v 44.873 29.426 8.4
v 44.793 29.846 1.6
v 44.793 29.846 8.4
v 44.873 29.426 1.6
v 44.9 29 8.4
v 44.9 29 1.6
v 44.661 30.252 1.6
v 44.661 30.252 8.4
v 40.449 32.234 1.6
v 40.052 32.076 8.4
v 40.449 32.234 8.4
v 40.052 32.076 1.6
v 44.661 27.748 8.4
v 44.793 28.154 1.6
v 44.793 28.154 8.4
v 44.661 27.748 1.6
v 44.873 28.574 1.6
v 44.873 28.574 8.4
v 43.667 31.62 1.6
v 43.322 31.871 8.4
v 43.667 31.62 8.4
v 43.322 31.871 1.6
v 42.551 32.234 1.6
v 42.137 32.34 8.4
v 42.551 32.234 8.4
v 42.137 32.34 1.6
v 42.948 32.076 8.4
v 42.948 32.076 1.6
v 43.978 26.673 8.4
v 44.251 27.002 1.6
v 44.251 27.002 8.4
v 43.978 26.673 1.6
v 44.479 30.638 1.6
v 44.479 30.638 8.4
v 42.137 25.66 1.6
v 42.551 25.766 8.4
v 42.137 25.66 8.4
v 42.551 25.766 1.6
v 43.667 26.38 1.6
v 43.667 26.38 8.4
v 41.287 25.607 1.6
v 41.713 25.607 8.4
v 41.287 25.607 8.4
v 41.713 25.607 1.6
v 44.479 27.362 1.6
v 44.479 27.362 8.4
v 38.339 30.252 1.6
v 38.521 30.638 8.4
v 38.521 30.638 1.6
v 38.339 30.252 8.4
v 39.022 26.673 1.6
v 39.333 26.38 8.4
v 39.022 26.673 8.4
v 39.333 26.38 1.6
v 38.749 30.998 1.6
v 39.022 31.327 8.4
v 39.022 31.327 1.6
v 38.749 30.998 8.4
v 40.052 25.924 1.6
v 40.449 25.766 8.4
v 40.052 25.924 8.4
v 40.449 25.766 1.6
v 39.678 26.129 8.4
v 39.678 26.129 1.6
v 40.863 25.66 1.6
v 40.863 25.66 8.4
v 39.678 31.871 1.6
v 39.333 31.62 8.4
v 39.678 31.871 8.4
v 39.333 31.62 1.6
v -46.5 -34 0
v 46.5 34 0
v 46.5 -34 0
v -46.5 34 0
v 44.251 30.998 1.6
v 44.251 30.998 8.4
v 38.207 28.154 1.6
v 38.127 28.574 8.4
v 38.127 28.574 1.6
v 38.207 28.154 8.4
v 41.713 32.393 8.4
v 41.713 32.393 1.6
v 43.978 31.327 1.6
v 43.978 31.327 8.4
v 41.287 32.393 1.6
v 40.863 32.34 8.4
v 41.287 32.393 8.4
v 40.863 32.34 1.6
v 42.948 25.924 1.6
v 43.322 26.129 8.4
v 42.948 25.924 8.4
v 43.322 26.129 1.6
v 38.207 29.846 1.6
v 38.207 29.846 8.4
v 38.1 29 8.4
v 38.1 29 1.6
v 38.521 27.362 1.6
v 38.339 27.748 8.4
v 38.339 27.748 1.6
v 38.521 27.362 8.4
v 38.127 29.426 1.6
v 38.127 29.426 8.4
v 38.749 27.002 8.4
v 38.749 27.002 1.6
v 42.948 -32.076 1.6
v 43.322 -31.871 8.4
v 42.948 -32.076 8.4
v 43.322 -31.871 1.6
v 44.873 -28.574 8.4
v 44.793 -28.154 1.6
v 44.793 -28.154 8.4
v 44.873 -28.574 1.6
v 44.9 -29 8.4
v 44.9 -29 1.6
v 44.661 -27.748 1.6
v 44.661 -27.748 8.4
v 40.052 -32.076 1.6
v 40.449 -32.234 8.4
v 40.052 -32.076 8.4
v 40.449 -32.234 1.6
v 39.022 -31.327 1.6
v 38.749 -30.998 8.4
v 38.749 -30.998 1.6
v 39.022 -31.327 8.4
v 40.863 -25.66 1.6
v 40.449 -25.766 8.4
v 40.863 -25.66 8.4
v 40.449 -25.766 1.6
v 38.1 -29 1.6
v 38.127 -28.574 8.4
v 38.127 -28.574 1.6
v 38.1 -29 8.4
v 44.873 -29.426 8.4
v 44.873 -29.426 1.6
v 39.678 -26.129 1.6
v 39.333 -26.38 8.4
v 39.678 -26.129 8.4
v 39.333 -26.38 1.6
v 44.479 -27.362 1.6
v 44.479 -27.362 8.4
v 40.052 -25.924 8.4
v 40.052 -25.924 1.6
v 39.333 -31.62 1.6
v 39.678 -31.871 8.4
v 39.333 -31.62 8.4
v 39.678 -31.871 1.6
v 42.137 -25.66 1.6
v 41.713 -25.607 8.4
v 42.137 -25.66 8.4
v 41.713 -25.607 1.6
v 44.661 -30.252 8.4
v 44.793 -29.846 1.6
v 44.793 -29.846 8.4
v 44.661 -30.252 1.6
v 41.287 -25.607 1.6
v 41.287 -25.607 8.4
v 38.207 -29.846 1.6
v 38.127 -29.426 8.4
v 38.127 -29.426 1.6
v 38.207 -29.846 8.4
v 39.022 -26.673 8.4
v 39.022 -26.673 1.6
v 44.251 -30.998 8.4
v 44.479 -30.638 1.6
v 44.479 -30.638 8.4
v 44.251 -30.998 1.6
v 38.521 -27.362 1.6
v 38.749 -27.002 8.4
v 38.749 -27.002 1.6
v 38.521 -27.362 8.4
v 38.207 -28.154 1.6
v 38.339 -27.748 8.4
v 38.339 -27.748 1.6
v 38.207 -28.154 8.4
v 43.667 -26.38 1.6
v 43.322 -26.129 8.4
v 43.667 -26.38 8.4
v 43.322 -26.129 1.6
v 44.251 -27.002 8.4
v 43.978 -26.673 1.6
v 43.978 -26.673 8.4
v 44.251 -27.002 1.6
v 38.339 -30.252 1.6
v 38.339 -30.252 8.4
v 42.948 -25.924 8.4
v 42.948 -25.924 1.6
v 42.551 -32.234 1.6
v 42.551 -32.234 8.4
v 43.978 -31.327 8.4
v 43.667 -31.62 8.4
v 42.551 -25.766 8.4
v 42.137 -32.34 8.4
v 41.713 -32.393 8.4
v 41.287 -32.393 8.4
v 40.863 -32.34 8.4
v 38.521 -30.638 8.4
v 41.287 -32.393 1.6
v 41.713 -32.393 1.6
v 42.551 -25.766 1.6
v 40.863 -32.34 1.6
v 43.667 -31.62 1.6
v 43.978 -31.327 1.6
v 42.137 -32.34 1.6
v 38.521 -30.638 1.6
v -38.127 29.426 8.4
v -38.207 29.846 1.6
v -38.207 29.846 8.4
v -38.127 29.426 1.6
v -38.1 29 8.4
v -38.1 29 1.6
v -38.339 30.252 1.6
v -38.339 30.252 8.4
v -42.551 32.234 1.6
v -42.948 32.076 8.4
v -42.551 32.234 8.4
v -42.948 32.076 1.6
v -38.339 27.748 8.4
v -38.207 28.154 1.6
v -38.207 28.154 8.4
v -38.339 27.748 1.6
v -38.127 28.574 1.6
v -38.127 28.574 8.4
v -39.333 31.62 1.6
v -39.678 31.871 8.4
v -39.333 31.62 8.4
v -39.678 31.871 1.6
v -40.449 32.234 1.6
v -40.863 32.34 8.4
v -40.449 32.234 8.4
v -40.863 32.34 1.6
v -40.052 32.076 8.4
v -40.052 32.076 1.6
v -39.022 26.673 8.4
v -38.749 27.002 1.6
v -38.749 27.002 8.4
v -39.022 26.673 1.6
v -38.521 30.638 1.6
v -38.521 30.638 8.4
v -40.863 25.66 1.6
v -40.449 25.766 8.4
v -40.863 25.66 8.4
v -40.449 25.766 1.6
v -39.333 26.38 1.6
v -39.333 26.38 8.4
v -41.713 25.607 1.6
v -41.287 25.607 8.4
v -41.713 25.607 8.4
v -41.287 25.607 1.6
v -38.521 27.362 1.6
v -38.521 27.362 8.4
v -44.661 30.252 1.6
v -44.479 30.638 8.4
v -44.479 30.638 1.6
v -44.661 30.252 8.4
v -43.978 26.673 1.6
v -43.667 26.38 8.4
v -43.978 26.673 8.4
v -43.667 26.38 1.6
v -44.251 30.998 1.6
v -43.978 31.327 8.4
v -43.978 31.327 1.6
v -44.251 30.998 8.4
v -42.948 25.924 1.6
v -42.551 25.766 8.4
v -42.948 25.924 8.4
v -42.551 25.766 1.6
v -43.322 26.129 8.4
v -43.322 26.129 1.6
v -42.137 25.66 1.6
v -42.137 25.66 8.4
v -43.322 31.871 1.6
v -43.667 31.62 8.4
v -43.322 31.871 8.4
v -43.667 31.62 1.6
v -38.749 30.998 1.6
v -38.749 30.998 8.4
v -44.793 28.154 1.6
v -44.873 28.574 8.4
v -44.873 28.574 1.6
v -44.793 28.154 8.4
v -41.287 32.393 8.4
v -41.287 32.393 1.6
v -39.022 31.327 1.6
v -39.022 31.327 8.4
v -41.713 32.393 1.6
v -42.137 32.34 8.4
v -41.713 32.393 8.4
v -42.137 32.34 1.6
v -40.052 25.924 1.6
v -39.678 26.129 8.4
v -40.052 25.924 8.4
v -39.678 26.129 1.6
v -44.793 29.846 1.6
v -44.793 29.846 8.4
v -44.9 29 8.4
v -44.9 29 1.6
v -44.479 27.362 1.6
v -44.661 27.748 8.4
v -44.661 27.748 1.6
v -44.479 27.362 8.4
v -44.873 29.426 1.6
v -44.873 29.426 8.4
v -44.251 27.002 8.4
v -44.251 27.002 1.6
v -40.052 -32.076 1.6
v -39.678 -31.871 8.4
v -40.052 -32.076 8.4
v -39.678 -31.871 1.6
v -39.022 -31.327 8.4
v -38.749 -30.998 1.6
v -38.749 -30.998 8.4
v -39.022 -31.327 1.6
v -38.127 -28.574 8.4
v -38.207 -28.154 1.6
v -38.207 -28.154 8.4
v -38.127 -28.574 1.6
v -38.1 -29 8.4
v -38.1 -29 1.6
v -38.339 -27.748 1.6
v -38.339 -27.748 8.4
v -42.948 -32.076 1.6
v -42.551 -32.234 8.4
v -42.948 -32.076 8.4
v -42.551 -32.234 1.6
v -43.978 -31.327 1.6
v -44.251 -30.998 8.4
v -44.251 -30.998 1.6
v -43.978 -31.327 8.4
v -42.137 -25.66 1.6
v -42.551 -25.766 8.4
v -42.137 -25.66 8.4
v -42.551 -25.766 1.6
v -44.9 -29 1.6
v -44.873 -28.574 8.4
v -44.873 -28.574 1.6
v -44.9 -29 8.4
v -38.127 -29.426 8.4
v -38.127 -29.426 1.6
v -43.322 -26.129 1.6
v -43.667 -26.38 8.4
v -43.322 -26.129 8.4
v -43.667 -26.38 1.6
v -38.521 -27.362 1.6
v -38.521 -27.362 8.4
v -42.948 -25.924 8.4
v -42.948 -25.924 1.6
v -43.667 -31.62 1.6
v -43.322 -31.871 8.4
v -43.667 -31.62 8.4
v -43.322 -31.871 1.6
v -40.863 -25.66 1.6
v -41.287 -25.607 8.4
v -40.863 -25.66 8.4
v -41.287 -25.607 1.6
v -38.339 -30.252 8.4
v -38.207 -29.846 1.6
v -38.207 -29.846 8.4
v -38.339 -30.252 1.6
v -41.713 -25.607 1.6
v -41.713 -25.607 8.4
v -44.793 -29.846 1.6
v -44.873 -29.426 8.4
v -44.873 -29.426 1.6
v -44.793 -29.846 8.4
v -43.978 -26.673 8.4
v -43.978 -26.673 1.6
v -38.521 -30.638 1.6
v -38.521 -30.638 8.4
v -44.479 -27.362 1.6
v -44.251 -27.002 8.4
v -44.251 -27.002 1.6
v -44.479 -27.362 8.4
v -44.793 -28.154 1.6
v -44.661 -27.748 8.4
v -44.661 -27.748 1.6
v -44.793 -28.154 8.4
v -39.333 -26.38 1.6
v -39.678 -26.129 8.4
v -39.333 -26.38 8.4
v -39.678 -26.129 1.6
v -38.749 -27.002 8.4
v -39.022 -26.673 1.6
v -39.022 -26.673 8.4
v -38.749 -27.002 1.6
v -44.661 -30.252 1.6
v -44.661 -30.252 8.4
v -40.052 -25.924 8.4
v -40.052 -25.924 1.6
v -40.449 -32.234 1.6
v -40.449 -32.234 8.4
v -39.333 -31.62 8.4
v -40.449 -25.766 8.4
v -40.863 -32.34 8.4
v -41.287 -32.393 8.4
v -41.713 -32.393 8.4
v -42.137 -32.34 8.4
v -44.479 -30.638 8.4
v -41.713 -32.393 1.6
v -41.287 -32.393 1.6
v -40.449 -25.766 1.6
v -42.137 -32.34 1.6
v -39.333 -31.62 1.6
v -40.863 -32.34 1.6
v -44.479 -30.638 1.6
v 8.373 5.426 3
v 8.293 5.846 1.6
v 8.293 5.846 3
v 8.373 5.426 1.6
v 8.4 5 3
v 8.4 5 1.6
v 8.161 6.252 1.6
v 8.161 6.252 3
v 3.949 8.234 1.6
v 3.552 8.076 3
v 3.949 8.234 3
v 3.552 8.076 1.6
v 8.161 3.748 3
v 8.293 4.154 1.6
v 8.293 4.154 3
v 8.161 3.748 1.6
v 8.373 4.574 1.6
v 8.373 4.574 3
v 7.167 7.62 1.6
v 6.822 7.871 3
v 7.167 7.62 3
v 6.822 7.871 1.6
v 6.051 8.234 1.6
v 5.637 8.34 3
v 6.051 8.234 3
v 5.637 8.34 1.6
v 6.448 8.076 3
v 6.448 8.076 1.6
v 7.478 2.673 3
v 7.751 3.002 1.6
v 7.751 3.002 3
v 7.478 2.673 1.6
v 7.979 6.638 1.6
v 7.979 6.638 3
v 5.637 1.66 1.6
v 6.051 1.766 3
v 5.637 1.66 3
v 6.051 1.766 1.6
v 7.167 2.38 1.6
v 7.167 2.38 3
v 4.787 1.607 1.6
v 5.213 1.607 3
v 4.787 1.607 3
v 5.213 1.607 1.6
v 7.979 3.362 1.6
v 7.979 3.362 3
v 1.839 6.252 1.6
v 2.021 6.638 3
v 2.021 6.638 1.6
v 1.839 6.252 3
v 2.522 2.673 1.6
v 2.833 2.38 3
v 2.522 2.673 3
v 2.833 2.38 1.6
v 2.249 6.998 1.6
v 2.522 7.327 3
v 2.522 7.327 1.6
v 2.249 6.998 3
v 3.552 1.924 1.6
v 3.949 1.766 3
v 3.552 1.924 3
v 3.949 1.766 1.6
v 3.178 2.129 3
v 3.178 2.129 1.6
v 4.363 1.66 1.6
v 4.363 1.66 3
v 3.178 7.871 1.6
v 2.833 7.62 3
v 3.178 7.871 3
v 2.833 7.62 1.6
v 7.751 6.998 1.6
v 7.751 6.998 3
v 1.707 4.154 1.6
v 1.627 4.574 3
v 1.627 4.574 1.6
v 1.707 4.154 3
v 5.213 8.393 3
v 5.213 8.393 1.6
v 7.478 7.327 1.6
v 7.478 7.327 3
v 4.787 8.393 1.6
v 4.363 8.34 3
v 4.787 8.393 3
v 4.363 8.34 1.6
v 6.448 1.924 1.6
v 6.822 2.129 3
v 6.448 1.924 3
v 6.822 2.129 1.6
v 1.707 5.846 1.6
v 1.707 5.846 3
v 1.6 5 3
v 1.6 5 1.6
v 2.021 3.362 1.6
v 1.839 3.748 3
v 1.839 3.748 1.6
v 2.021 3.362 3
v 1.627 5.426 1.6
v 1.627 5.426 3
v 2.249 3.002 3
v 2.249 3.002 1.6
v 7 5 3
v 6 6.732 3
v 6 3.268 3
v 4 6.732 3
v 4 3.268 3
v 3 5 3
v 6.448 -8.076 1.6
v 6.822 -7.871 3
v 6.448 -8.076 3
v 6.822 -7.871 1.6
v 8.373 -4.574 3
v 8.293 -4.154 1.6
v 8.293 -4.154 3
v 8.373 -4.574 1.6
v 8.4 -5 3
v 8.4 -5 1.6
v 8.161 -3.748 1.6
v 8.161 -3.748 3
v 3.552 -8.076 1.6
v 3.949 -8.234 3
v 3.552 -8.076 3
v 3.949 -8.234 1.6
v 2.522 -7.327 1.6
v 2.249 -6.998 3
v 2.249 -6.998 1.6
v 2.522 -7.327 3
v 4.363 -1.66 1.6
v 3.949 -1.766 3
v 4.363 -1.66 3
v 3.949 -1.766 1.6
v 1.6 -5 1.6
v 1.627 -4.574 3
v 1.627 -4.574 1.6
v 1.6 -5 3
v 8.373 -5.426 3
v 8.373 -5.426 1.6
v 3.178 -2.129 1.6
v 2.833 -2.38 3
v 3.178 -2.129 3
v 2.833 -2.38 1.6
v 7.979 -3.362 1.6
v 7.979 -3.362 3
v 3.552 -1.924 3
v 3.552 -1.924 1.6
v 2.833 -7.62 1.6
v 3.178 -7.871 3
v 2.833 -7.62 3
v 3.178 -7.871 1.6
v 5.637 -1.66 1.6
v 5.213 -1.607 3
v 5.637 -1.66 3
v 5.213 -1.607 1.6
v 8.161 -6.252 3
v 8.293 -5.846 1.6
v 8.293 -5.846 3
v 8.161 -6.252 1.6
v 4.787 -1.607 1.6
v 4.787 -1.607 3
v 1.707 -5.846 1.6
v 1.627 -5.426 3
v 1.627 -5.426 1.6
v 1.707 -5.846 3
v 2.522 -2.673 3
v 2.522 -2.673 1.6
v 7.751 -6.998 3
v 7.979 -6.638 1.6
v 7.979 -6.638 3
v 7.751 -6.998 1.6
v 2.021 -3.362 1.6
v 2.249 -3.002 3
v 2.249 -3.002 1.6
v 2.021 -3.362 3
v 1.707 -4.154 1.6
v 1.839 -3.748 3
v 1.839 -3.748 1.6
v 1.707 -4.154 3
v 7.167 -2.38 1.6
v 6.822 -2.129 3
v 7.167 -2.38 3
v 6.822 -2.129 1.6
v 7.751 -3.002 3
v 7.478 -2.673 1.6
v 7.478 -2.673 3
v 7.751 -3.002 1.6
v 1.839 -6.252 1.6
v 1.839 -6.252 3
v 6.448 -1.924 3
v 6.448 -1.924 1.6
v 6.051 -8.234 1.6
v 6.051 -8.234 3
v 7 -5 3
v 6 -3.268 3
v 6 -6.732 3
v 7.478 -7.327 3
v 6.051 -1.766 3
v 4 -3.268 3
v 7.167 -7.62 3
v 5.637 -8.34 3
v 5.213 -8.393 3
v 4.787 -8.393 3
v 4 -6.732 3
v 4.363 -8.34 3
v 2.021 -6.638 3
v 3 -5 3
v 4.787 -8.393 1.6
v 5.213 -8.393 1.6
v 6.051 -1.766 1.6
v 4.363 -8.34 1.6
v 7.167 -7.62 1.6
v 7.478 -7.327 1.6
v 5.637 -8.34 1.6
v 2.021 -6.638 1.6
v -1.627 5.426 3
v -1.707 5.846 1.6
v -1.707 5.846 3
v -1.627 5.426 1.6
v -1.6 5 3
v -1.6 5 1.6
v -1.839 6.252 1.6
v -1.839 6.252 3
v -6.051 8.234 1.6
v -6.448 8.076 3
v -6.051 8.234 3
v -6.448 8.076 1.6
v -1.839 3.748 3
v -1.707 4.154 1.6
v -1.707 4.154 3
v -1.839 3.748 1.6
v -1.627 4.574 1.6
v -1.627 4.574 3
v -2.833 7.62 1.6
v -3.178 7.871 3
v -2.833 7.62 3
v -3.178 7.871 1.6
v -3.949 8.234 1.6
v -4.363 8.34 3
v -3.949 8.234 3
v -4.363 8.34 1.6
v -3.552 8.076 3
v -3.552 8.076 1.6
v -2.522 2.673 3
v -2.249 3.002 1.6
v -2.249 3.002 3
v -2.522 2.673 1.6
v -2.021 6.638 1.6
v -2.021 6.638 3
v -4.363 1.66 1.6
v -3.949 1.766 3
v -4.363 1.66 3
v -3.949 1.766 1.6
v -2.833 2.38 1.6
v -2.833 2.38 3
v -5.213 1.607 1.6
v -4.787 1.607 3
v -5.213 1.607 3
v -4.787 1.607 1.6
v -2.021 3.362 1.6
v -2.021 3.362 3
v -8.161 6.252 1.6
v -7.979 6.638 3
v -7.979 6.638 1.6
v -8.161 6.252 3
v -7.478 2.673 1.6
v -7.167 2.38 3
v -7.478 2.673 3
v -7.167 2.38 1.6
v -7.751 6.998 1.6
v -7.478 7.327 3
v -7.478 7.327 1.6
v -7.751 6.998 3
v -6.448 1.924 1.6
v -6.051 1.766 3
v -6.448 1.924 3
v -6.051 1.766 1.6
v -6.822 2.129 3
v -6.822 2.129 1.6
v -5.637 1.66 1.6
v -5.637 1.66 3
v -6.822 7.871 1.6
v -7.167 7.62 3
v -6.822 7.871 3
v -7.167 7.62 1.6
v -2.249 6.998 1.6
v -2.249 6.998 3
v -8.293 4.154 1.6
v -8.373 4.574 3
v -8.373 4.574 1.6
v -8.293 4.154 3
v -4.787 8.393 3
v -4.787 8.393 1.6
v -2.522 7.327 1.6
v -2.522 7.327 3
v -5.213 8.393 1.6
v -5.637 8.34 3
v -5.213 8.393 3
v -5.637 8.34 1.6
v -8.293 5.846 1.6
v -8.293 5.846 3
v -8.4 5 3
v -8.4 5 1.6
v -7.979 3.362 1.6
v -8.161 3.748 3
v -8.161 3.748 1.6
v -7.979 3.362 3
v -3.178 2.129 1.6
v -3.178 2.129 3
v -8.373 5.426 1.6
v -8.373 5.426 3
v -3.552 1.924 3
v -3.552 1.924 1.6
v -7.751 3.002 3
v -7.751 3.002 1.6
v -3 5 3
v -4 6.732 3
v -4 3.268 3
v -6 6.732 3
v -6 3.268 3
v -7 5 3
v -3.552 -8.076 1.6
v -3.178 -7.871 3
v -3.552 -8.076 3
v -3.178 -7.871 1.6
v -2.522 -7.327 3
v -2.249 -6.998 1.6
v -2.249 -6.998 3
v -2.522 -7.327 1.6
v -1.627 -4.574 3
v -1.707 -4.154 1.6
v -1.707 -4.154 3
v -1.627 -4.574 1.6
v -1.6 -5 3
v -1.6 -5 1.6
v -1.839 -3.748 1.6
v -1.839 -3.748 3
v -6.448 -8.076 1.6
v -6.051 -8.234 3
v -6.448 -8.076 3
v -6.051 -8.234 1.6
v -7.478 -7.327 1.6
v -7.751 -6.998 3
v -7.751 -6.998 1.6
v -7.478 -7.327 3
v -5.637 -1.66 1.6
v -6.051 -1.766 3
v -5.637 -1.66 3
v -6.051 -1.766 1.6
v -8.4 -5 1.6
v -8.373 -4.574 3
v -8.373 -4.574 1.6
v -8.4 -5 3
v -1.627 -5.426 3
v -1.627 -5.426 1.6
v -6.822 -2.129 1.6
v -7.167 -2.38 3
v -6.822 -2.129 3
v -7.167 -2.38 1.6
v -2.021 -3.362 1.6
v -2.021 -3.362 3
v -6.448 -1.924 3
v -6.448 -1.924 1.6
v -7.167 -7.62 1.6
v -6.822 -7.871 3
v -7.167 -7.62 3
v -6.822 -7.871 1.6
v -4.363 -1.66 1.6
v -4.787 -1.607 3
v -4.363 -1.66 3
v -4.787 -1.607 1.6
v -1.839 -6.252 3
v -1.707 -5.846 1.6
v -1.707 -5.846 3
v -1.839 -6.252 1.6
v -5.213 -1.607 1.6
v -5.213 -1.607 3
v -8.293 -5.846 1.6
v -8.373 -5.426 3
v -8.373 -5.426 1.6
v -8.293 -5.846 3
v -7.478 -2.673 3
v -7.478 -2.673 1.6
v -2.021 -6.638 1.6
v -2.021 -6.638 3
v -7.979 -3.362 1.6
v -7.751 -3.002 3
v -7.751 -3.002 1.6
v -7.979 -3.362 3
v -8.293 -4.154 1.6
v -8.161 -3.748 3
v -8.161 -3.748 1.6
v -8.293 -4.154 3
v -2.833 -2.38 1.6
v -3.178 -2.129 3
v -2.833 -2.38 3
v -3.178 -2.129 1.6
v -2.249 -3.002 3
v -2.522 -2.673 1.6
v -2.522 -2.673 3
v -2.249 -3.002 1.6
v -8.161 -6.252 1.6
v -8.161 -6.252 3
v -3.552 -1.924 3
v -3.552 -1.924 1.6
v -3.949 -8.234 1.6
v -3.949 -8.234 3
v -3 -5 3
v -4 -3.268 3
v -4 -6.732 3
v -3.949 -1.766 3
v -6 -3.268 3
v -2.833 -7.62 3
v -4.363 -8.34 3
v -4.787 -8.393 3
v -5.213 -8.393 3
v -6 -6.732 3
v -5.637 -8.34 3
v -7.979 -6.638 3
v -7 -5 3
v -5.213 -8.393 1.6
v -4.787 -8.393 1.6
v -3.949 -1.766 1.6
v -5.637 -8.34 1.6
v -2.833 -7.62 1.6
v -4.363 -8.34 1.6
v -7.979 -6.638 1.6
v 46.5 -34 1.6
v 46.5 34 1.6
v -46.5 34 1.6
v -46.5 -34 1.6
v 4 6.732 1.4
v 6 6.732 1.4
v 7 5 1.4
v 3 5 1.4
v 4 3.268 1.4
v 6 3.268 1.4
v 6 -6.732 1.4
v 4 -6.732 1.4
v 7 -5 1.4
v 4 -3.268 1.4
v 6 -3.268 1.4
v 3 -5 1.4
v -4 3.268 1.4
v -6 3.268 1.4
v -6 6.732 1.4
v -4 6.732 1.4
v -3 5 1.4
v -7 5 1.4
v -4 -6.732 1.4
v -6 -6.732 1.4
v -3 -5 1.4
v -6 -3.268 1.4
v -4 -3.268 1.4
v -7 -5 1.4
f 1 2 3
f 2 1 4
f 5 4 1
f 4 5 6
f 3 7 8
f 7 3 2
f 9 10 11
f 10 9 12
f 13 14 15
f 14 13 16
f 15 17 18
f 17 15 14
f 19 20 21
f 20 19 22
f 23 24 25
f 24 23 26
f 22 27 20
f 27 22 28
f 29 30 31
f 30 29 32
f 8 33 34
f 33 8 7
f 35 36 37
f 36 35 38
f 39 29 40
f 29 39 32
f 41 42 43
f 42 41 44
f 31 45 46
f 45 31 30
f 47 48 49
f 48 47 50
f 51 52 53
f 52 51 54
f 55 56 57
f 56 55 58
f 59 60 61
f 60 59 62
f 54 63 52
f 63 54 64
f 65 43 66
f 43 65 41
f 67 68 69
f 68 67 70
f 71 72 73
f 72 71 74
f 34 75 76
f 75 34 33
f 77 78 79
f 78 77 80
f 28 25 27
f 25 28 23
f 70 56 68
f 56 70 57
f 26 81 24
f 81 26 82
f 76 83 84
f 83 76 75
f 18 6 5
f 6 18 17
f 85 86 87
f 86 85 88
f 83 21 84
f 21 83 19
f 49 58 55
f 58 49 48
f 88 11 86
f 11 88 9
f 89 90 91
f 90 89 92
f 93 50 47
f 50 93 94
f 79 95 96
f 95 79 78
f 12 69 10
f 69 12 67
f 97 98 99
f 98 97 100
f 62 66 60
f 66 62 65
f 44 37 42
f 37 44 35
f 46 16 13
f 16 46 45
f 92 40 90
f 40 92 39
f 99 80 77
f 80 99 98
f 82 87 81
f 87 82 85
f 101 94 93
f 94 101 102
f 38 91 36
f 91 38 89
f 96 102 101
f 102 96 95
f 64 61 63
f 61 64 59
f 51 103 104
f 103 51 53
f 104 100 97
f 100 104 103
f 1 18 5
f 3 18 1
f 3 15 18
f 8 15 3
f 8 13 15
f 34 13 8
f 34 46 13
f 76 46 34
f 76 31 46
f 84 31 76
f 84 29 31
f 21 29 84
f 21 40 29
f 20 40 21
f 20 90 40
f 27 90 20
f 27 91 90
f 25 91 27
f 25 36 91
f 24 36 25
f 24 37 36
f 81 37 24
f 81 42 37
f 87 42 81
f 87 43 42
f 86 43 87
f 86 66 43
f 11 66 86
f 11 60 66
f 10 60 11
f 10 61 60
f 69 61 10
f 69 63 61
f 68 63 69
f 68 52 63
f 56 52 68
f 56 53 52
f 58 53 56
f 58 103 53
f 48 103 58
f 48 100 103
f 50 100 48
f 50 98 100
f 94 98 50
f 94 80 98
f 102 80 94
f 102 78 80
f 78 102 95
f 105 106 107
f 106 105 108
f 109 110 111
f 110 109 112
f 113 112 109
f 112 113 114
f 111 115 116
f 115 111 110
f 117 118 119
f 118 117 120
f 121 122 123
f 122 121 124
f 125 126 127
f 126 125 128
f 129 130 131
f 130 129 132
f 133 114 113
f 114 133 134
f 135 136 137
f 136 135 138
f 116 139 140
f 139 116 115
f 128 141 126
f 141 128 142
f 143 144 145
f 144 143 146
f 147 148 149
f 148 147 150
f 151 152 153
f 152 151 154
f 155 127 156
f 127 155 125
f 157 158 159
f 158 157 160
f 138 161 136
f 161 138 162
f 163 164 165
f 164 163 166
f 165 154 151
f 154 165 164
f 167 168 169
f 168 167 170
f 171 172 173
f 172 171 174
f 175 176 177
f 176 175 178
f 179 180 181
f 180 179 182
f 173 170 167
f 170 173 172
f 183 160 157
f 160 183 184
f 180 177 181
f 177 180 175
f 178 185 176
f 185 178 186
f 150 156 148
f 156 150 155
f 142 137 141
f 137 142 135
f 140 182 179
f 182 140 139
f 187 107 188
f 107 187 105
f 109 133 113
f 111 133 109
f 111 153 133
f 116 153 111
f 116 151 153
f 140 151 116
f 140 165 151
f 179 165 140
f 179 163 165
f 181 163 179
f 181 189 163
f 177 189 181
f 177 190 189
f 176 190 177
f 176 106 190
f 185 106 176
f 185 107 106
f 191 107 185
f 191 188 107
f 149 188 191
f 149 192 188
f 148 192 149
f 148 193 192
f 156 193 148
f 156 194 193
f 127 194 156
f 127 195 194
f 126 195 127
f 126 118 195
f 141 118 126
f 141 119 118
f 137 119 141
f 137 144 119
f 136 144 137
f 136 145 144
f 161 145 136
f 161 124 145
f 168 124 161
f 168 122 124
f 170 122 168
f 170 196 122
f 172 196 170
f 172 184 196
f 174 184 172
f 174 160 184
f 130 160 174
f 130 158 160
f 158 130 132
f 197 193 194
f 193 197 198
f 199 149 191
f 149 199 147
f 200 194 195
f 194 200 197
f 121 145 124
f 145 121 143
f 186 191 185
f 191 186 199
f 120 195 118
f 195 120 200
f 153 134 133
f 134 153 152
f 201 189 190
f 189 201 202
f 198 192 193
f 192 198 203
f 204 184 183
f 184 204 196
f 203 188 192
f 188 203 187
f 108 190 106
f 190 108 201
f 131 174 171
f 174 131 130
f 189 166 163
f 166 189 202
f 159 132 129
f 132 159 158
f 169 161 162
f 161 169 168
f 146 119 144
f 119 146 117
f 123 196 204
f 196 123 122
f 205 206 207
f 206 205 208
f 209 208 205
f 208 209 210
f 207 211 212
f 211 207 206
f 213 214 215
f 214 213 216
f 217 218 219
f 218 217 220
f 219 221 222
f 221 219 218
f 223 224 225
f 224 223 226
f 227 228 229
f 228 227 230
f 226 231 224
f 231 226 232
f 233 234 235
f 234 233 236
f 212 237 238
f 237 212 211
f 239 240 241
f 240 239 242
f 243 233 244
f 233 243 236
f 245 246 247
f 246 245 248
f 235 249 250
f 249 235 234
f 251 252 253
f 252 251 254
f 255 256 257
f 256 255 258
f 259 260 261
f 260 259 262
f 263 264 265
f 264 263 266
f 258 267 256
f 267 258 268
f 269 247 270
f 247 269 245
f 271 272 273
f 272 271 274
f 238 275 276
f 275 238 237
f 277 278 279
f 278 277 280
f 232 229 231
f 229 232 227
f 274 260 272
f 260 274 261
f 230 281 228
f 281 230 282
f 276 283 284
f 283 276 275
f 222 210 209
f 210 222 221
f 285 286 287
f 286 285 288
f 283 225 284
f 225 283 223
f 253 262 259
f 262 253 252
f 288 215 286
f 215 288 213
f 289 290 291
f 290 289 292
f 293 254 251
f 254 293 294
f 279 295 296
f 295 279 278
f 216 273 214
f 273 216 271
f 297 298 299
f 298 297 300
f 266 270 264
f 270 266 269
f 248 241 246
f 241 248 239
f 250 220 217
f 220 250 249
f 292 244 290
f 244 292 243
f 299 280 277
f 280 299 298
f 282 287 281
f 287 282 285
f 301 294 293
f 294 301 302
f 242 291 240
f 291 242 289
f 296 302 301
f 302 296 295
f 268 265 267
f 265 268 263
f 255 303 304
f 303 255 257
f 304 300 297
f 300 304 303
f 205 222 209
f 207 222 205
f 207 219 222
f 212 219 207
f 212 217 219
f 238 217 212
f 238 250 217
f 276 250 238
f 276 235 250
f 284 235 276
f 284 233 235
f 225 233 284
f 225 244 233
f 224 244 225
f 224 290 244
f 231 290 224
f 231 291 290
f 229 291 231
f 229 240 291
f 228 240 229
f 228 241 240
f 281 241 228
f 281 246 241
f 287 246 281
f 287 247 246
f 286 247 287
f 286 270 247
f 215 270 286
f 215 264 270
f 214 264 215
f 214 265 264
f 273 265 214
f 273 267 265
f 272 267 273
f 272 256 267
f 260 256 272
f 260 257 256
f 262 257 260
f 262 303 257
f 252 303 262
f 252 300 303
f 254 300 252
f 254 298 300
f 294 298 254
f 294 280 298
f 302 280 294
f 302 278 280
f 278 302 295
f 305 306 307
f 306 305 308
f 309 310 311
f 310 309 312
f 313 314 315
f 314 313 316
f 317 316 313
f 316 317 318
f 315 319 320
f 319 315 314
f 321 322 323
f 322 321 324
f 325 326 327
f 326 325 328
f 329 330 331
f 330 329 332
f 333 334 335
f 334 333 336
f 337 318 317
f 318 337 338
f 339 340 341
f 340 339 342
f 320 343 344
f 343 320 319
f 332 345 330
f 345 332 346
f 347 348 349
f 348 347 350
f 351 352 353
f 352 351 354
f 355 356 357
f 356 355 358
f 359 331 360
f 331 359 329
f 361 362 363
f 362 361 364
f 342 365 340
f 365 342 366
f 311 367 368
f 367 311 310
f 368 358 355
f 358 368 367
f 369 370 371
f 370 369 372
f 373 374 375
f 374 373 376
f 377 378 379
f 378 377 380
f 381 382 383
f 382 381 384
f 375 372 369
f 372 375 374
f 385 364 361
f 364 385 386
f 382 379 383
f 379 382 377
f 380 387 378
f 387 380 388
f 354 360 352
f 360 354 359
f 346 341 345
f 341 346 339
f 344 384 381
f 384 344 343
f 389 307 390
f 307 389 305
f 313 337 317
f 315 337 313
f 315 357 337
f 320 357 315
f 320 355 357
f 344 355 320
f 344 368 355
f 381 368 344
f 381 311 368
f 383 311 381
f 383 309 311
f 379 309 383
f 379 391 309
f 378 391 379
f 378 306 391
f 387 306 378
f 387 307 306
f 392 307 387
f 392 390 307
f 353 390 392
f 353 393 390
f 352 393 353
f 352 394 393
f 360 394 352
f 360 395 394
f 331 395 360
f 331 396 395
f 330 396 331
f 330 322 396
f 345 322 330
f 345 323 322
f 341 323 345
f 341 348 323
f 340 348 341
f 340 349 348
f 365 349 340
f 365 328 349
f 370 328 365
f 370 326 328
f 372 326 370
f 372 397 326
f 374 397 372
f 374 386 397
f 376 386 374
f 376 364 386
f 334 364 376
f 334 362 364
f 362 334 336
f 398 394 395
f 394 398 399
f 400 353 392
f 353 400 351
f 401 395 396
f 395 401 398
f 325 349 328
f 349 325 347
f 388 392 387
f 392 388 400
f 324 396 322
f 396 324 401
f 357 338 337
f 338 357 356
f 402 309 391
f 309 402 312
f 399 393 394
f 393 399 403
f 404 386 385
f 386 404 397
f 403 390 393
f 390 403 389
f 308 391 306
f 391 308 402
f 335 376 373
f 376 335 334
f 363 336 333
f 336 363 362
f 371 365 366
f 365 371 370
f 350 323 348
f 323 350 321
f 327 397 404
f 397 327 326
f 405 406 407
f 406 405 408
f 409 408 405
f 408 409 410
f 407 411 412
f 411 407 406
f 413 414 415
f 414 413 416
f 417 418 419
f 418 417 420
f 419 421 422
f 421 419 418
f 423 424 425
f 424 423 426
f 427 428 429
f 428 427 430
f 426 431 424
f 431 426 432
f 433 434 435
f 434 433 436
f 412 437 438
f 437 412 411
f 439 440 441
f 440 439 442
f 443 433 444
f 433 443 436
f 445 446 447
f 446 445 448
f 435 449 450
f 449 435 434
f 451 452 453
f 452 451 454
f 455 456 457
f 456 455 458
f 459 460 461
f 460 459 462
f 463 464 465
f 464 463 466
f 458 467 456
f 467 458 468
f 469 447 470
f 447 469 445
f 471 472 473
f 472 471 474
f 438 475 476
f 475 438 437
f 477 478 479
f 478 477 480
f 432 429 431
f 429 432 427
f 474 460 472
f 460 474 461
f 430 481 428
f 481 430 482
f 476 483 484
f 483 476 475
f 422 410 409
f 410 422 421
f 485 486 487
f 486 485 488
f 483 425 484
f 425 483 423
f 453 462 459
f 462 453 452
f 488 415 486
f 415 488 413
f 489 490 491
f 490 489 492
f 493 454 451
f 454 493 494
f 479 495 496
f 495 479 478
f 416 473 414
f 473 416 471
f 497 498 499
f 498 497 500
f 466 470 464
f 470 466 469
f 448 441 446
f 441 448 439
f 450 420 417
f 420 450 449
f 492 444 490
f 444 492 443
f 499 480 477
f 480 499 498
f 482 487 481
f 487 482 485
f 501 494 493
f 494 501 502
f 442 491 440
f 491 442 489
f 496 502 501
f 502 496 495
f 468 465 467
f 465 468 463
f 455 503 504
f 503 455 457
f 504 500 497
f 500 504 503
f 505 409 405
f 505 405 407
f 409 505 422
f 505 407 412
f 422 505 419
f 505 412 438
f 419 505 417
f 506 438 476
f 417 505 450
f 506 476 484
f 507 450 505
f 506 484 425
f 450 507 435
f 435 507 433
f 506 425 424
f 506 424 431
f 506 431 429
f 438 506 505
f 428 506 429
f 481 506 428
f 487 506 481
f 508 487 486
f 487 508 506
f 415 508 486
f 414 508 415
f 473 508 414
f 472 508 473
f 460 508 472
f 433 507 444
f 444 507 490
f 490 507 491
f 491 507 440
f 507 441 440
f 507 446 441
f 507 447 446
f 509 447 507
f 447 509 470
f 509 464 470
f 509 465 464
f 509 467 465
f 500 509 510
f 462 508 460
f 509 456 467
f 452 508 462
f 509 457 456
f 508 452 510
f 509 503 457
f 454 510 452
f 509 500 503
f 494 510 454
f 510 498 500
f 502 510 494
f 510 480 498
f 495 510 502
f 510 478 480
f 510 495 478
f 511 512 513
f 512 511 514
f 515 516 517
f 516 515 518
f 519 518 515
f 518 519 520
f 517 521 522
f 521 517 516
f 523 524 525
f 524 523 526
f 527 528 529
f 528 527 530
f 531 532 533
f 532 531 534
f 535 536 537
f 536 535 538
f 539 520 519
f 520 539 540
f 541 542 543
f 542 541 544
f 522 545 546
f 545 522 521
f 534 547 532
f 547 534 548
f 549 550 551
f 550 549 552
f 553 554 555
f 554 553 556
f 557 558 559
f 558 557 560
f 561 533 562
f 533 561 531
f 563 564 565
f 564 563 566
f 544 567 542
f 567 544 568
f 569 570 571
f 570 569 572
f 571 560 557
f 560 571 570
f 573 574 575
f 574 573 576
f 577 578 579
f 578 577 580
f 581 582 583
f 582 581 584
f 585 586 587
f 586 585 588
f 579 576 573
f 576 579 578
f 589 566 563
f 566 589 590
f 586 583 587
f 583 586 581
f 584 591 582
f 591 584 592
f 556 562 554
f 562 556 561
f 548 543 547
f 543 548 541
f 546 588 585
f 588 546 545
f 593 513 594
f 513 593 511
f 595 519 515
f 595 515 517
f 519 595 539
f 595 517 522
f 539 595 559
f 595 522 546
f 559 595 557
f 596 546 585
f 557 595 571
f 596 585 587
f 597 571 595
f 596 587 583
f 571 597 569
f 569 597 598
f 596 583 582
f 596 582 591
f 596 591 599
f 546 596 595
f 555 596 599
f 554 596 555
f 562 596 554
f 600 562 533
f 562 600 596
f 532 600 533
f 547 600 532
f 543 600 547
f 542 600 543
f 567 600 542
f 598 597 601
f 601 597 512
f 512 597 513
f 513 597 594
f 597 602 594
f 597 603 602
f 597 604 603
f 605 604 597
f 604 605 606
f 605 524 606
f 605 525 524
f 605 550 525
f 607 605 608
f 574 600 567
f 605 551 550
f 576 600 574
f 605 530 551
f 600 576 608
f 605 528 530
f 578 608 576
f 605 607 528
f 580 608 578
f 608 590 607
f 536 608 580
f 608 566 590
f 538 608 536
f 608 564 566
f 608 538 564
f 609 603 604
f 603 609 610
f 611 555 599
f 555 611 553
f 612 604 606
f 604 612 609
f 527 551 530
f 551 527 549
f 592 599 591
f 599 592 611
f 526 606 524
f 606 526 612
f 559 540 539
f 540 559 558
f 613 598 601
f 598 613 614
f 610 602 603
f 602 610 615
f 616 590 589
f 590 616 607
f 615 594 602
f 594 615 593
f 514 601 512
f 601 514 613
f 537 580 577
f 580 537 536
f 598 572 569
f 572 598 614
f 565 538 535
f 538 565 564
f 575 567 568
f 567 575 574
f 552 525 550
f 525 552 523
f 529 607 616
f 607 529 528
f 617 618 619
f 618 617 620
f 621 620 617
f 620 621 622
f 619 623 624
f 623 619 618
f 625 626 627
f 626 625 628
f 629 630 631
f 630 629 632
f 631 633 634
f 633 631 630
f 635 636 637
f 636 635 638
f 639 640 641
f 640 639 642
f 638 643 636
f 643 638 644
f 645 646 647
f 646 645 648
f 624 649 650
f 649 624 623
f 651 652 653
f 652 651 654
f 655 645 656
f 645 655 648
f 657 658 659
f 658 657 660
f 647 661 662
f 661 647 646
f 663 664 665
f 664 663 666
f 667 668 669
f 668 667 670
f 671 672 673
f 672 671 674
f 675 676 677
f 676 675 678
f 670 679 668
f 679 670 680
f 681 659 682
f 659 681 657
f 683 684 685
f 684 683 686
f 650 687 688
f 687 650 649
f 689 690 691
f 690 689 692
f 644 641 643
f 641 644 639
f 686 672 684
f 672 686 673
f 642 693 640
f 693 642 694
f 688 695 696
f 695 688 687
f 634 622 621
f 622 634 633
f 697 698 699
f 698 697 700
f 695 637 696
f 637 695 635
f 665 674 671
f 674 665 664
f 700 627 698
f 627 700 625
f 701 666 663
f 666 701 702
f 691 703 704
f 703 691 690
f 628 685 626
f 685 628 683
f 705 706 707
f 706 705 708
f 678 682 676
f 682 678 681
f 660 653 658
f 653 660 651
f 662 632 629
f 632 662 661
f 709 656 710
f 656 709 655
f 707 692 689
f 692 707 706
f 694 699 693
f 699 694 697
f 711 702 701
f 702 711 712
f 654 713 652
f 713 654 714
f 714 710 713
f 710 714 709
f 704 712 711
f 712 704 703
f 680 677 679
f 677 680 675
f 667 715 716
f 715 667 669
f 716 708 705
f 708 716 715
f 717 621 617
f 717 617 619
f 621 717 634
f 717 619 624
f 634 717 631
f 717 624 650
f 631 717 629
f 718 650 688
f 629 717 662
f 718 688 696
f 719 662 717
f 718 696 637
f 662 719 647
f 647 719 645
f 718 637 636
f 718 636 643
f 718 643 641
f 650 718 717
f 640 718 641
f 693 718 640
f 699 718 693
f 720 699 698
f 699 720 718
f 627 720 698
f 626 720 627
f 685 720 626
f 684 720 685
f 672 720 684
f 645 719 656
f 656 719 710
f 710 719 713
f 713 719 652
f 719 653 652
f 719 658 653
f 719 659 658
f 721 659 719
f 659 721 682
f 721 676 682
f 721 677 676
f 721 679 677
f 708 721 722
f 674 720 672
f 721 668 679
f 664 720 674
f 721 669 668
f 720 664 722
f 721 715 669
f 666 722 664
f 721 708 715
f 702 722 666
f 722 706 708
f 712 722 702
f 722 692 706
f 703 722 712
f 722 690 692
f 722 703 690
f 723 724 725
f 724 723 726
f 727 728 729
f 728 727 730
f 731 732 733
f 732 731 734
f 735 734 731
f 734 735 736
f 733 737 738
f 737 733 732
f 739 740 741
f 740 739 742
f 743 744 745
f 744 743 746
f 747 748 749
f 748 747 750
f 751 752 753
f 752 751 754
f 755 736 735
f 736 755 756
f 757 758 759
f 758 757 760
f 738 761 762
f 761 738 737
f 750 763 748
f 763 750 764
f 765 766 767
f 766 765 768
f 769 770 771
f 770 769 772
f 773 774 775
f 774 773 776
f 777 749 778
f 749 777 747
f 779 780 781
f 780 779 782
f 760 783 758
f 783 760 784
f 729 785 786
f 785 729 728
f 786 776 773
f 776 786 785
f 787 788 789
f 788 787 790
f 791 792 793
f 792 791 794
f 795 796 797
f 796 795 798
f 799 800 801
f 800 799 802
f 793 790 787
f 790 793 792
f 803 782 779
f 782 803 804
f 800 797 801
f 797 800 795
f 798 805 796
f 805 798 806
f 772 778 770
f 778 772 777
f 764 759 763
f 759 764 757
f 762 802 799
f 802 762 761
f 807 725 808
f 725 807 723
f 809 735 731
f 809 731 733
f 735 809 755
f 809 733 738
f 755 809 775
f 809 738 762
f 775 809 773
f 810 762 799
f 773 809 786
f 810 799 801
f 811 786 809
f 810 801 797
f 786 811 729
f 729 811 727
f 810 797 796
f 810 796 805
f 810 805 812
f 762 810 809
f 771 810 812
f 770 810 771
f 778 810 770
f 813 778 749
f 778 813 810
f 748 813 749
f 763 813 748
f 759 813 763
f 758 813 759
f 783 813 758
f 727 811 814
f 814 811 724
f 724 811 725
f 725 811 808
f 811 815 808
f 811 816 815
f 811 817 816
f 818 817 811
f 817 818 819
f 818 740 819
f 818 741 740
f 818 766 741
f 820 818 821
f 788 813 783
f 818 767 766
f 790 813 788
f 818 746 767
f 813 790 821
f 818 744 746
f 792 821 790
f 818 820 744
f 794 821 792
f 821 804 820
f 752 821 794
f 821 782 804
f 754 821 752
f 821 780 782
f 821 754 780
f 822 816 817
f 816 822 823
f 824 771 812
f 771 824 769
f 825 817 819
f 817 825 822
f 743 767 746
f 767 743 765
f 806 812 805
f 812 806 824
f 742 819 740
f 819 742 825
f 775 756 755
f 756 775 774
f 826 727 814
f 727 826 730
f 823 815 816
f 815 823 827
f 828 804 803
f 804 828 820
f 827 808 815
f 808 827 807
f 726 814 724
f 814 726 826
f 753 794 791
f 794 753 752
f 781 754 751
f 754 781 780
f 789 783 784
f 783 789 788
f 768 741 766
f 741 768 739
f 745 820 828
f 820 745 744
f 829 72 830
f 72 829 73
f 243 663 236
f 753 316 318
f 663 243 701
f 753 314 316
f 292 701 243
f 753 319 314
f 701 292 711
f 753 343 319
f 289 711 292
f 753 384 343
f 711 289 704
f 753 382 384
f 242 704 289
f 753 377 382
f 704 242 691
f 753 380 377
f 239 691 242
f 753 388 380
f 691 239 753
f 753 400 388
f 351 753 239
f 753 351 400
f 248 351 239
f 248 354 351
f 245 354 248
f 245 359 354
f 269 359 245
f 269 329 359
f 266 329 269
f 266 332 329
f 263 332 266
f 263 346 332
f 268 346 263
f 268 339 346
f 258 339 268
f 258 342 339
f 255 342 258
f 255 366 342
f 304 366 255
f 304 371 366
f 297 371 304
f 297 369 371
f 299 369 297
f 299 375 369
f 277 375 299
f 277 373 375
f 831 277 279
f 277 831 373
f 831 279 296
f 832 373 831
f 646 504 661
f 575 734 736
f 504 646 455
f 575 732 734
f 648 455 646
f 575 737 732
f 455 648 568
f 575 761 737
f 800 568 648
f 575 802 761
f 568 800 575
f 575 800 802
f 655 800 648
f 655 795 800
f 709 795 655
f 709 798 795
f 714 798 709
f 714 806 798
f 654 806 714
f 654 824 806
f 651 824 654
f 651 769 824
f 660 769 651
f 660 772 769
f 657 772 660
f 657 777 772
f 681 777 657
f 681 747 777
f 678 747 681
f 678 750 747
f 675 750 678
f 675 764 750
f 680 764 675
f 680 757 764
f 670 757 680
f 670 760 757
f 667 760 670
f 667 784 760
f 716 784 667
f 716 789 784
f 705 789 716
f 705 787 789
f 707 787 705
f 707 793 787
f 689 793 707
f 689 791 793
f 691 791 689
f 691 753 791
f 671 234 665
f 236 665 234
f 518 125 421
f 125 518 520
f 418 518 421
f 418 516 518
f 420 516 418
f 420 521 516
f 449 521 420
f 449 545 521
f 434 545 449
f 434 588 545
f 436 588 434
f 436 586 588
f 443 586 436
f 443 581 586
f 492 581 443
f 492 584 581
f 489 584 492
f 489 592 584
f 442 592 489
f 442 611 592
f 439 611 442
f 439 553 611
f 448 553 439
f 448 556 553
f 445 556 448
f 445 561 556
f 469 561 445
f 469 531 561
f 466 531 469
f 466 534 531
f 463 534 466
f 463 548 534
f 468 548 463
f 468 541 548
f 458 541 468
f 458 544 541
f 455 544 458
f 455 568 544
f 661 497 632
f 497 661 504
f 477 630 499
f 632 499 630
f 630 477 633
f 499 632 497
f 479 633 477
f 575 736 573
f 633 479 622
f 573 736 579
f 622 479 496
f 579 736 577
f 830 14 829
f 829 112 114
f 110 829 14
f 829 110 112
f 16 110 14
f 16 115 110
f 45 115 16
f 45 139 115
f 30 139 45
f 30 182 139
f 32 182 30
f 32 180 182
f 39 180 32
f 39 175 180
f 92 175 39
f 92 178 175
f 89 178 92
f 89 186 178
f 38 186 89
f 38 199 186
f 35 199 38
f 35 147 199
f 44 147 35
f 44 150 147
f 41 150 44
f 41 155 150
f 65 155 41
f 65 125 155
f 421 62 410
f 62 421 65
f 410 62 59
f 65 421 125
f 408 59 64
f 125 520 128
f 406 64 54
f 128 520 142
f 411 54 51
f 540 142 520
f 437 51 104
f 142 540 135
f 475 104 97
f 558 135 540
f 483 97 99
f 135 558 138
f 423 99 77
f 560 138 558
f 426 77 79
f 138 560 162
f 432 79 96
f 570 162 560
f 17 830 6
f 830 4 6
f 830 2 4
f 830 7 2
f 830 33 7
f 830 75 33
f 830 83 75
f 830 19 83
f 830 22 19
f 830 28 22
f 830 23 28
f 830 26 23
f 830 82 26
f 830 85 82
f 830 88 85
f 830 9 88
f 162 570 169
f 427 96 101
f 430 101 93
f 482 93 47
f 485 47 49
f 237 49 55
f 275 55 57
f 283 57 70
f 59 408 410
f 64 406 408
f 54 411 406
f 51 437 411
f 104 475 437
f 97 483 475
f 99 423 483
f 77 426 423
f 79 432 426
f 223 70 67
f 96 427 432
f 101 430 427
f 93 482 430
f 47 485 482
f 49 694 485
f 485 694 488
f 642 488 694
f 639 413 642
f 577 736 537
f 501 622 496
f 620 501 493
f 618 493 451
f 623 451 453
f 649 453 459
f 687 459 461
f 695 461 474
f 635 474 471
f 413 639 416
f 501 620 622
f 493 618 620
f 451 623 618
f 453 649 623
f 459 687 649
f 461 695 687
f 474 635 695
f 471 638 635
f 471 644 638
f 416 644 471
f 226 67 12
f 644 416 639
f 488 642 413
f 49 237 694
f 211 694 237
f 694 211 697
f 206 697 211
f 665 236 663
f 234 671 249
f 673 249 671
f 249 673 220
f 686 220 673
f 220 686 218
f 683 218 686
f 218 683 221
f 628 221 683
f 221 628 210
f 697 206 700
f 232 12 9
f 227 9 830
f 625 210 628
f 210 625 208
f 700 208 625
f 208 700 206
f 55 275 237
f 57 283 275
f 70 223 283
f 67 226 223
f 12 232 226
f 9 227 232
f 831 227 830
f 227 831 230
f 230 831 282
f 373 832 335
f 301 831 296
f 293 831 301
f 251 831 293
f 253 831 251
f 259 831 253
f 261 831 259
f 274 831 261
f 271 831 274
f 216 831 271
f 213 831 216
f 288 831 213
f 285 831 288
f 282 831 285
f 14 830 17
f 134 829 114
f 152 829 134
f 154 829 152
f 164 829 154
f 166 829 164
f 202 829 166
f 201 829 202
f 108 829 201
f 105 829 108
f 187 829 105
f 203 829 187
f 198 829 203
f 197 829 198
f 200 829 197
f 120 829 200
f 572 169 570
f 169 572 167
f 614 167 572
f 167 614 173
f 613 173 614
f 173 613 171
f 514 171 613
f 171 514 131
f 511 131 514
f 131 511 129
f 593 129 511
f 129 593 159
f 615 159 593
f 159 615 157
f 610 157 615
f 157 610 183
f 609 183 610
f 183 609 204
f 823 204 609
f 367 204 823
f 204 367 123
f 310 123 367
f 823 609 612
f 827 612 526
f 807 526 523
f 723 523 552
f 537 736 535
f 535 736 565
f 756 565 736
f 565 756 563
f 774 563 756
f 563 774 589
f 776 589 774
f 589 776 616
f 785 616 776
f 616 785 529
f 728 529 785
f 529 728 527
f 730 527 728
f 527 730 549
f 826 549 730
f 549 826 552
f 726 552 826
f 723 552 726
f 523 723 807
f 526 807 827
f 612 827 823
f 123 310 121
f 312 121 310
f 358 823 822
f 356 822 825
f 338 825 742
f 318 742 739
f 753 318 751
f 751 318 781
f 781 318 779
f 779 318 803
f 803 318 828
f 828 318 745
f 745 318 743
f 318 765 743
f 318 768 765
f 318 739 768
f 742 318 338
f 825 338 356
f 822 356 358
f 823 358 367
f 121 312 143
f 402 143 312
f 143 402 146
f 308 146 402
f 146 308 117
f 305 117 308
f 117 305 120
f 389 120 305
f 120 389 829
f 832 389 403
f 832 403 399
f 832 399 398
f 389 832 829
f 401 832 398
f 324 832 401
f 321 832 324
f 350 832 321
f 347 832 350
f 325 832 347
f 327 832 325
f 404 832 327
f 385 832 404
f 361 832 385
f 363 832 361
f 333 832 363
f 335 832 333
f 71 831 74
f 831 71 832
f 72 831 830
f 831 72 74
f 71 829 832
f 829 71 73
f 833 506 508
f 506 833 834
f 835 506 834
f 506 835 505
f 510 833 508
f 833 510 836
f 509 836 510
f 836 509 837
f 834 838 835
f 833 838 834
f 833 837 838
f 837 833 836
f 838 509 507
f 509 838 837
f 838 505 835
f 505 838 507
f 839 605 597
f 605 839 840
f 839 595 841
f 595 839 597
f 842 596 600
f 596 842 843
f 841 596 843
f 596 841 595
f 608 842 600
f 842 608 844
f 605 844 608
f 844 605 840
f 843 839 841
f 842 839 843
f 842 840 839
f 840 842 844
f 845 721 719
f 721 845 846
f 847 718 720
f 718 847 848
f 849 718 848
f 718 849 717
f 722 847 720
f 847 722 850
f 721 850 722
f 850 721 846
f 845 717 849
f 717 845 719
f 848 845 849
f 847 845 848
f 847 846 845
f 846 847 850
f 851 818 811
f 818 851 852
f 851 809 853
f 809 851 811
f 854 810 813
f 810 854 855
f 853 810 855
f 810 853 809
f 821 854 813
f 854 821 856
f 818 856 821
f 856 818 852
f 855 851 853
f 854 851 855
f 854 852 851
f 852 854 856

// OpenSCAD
// file: configuration/general.scad
//Back plate
BACK_PLATE_THICKNESS=3;

CIRCUIT_BOARD_SCREWSTANDARD0=2;

//Adapter0
CIRCUIT_BOARD_ADAPTER0_SPACING=10;
CIRCUIT_BOARD_ADAPTER0_SCREW_HEIGHT=6-BACK_PLATE_THICKNESS;
CIRCUIT_BOARD_ADAPTER0_SCREW_TRAP_HEIGHT=1.6;
// file: utils/hex_trap.scad
module hex_hole(h_trap,h_hole,r_trap,r_hole,rot)
{
    rotate([rot,0,0]) {
translate([0,0,h_hole])
{
	cylinder(h = h_trap, r = r_trap, $fn = 6);
}

	cylinder(h = h_hole, r = r_hole, $fn = 20);

}
}
/*
width=18;
length=60;
h_hole=2;
h_trap=4;
r_trap=3;
r_hole=2;
spacer=4;
explode=false;
if (explode)
{
cube(size = [width,length,h_hole+h_trap], center = false);
translate([0,0,10]){
hex_hole(h_trap,h_hole,r_trap,r_hole,width/2,4,0);
hex_hole(h_trap,h_hole,r_trap+1,r_hole,width/2,12,0);
hex_hole(h_trap,h_hole,r_trap+2,r_hole,width/2,22,0);
hex_hole(h_trap,h_hole,r_trap+3,r_hole,width/2,33,0);}
}
else
{
difference() {
cube(size = [width,length,h_hole+h_trap], center = false);
hex_hole(h_trap,h_hole,r_trap-0.5,r_hole,width/2,5,0);
hex_hole(h_trap,h_hole,r_trap,r_hole,width/2,13,0);
hex_hole(h_trap,h_hole,r_trap+1,r_hole,width/2,23,0);
hex_hole(h_trap,h_hole,r_trap+2,r_hole,width/2,36,0);
hex_hole(h_trap,h_hole,r_trap+3,r_hole,width/2,50,0);
}
}

*/
// file: utils/circuit_plate.scad
include <hex_trap.scad>;
include <../configuration/general.scad>;


module traps(base_height,base_hole_height)
{
translate([base_length/2,base_width/2,base_height])
hex_hole(base_trap_height,base_hole_height,CIRCUIT_BOARD_SCREWSTANDARD0,180);
translate([base_length/2,-base_width/2,base_height])
hex_hole(base_trap_height,base_hole_height,CIRCUIT_BOARD_SCREWSTANDARD0,180);
translate([-base_length/2,base_width/2,base_height])
hex_hole(base_trap_height,base_hole_height,CIRCUIT_BOARD_SCREWSTANDARD0,180);
translate([-base_length/2,-base_width/2,base_height])
hex_hole(base_trap_height,base_hole_height,CIRCUIT_BOARD_SCREWSTANDARD0,180);
    
translate([CIRCUIT_BOARD_ADAPTER0_SPACING/2,CIRCUIT_BOARD_ADAPTER0_SPACING/2,0])
hex_hole(CIRCUIT_BOARD_ADAPTER0_SCREW_TRAP_HEIGHT,CIRCUIT_BOARD_ADAPTER0_SCREW_HEIGHT - CIRCUIT_BOARD_ADAPTER0_SCREW_TRAP_HEIGHT,CIRCUIT_BOARD_SCREWSTANDARD0,0);
translate([CIRCUIT_BOARD_ADAPTER0_SPACING/2,-CIRCUIT_BOARD_ADAPTER0_SPACING/2,0])
hex_hole(CIRCUIT_BOARD_ADAPTER0_SCREW_TRAP_HEIGHT,CIRCUIT_BOARD_ADAPTER0_SCREW_HEIGHT - CIRCUIT_BOARD_ADAPTER0_SCREW_TRAP_HEIGHT,CIRCUIT_BOARD_SCREWSTANDARD0,0);
translate([-CIRCUIT_BOARD_ADAPTER0_SPACING/2,CIRCUIT_BOARD_ADAPTER0_SPACING/2,0])
hex_hole(CIRCUIT_BOARD_ADAPTER0_SCREW_TRAP_HEIGHT,CIRCUIT_BOARD_ADAPTER0_SCREW_HEIGHT - CIRCUIT_BOARD_ADAPTER0_SCREW_TRAP_HEIGHT,CIRCUIT_BOARD_SCREWSTANDARD0,0);
translate([-CIRCUIT_BOARD_ADAPTER0_SPACING/2,-CIRCUIT_BOARD_ADAPTER0_SPACING/2,0])
hex_hole(CIRCUIT_BOARD_ADAPTER0_SCREW_TRAP_HEIGHT,CIRCUIT_BOARD_ADAPTER0_SCREW_HEIGHT - CIRCUIT_BOARD_ADAPTER0_SCREW_TRAP_HEIGHT,CIRCUIT_BOARD_SCREWSTANDARD0,0);
}
module pillars(base_height)
{
    translate([base_length/2,base_width/2,0])
cylinder(r=CIRCUIT_BOARD_SCREWSTANDARD0*1.7,h=base_height,$fn=50);
    translate([base_length/2,-base_width/2,0])
cylinder(r=CIRCUIT_BOARD_SCREWSTANDARD0*1.7,h=base_height,$fn=50);
    translate([-base_length/2,base_width/2,0])
cylinder(r=CIRCUIT_BOARD_SCREWSTANDARD0*1.7,h=base_height,$fn=50);
    translate([-base_length/2,-base_width/2,0])
cylinder(r=CIRCUIT_BOARD_SCREWSTANDARD0*1.7,h=base_height,$fn=50);
    
    translate([CIRCUIT_BOARD_ADAPTER0_SPACING/2,CIRCUIT_BOARD_ADAPTER0_SPACING/2,0])
cylinder(r=CIRCUIT_BOARD_SCREWSTANDARD0*1.7,h=CIRCUIT_BOARD_ADAPTER0_SCREW_HEIGHT,$fn=50);
    translate([CIRCUIT_BOARD_ADAPTER0_SPACING/2,-CIRCUIT_BOARD_ADAPTER0_SPACING/2,0])
cylinder(r=CIRCUIT_BOARD_SCREWSTANDARD0*1.7,h=CIRCUIT_BOARD_ADAPTER0_SCREW_HEIGHT,$fn=50);
    translate([-CIRCUIT_BOARD_ADAPTER0_SPACING/2,CIRCUIT_BOARD_ADAPTER0_SPACING/2,0])
cylinder(r=CIRCUIT_BOARD_SCREWSTANDARD0*1.7,h=CIRCUIT_BOARD_ADAPTER0_SCREW_HEIGHT,$fn=50);
    translate([-CIRCUIT_BOARD_ADAPTER0_SPACING/2,-CIRCUIT_BOARD_ADAPTER0_SPACING/2,0])
cylinder(r=CIRCUIT_BOARD_SCREWSTANDARD0*1.7,h=CIRCUIT_BOARD_ADAPTER0_SCREW_HEIGHT,$fn=50);
}
module box()
{
    
    translate([-base_length/2-base_padding,-base_width/2-base_padding,0])
    cube(size=[base_length+base_padding*2,base_width+base_padding*2,base_trap_height],center=false);
}
module circuit_plate(base_length,base_width,base_padding,pcb_thickness,base_trap_height,screw_height)
{
base_height=screw_height-pcb_thickness;    
base_hole_height=base_height-base_trap_height;

difference(){
    union(){
        box();
        pillars(base_height);
        }
        traps(base_height,base_hole_height);
}
}
// main file
include <utils/circuit_plate.scad>;

screw_standard0=2;
base_length=83;
base_width=58;
base_padding=5;
pcb_thickness=1.6;
screw_height=10;
base_trap_height=1.6;
circuit_plate(base_length,base_width,base_padding,pcb_thickness,base_trap_height,screw_height);
